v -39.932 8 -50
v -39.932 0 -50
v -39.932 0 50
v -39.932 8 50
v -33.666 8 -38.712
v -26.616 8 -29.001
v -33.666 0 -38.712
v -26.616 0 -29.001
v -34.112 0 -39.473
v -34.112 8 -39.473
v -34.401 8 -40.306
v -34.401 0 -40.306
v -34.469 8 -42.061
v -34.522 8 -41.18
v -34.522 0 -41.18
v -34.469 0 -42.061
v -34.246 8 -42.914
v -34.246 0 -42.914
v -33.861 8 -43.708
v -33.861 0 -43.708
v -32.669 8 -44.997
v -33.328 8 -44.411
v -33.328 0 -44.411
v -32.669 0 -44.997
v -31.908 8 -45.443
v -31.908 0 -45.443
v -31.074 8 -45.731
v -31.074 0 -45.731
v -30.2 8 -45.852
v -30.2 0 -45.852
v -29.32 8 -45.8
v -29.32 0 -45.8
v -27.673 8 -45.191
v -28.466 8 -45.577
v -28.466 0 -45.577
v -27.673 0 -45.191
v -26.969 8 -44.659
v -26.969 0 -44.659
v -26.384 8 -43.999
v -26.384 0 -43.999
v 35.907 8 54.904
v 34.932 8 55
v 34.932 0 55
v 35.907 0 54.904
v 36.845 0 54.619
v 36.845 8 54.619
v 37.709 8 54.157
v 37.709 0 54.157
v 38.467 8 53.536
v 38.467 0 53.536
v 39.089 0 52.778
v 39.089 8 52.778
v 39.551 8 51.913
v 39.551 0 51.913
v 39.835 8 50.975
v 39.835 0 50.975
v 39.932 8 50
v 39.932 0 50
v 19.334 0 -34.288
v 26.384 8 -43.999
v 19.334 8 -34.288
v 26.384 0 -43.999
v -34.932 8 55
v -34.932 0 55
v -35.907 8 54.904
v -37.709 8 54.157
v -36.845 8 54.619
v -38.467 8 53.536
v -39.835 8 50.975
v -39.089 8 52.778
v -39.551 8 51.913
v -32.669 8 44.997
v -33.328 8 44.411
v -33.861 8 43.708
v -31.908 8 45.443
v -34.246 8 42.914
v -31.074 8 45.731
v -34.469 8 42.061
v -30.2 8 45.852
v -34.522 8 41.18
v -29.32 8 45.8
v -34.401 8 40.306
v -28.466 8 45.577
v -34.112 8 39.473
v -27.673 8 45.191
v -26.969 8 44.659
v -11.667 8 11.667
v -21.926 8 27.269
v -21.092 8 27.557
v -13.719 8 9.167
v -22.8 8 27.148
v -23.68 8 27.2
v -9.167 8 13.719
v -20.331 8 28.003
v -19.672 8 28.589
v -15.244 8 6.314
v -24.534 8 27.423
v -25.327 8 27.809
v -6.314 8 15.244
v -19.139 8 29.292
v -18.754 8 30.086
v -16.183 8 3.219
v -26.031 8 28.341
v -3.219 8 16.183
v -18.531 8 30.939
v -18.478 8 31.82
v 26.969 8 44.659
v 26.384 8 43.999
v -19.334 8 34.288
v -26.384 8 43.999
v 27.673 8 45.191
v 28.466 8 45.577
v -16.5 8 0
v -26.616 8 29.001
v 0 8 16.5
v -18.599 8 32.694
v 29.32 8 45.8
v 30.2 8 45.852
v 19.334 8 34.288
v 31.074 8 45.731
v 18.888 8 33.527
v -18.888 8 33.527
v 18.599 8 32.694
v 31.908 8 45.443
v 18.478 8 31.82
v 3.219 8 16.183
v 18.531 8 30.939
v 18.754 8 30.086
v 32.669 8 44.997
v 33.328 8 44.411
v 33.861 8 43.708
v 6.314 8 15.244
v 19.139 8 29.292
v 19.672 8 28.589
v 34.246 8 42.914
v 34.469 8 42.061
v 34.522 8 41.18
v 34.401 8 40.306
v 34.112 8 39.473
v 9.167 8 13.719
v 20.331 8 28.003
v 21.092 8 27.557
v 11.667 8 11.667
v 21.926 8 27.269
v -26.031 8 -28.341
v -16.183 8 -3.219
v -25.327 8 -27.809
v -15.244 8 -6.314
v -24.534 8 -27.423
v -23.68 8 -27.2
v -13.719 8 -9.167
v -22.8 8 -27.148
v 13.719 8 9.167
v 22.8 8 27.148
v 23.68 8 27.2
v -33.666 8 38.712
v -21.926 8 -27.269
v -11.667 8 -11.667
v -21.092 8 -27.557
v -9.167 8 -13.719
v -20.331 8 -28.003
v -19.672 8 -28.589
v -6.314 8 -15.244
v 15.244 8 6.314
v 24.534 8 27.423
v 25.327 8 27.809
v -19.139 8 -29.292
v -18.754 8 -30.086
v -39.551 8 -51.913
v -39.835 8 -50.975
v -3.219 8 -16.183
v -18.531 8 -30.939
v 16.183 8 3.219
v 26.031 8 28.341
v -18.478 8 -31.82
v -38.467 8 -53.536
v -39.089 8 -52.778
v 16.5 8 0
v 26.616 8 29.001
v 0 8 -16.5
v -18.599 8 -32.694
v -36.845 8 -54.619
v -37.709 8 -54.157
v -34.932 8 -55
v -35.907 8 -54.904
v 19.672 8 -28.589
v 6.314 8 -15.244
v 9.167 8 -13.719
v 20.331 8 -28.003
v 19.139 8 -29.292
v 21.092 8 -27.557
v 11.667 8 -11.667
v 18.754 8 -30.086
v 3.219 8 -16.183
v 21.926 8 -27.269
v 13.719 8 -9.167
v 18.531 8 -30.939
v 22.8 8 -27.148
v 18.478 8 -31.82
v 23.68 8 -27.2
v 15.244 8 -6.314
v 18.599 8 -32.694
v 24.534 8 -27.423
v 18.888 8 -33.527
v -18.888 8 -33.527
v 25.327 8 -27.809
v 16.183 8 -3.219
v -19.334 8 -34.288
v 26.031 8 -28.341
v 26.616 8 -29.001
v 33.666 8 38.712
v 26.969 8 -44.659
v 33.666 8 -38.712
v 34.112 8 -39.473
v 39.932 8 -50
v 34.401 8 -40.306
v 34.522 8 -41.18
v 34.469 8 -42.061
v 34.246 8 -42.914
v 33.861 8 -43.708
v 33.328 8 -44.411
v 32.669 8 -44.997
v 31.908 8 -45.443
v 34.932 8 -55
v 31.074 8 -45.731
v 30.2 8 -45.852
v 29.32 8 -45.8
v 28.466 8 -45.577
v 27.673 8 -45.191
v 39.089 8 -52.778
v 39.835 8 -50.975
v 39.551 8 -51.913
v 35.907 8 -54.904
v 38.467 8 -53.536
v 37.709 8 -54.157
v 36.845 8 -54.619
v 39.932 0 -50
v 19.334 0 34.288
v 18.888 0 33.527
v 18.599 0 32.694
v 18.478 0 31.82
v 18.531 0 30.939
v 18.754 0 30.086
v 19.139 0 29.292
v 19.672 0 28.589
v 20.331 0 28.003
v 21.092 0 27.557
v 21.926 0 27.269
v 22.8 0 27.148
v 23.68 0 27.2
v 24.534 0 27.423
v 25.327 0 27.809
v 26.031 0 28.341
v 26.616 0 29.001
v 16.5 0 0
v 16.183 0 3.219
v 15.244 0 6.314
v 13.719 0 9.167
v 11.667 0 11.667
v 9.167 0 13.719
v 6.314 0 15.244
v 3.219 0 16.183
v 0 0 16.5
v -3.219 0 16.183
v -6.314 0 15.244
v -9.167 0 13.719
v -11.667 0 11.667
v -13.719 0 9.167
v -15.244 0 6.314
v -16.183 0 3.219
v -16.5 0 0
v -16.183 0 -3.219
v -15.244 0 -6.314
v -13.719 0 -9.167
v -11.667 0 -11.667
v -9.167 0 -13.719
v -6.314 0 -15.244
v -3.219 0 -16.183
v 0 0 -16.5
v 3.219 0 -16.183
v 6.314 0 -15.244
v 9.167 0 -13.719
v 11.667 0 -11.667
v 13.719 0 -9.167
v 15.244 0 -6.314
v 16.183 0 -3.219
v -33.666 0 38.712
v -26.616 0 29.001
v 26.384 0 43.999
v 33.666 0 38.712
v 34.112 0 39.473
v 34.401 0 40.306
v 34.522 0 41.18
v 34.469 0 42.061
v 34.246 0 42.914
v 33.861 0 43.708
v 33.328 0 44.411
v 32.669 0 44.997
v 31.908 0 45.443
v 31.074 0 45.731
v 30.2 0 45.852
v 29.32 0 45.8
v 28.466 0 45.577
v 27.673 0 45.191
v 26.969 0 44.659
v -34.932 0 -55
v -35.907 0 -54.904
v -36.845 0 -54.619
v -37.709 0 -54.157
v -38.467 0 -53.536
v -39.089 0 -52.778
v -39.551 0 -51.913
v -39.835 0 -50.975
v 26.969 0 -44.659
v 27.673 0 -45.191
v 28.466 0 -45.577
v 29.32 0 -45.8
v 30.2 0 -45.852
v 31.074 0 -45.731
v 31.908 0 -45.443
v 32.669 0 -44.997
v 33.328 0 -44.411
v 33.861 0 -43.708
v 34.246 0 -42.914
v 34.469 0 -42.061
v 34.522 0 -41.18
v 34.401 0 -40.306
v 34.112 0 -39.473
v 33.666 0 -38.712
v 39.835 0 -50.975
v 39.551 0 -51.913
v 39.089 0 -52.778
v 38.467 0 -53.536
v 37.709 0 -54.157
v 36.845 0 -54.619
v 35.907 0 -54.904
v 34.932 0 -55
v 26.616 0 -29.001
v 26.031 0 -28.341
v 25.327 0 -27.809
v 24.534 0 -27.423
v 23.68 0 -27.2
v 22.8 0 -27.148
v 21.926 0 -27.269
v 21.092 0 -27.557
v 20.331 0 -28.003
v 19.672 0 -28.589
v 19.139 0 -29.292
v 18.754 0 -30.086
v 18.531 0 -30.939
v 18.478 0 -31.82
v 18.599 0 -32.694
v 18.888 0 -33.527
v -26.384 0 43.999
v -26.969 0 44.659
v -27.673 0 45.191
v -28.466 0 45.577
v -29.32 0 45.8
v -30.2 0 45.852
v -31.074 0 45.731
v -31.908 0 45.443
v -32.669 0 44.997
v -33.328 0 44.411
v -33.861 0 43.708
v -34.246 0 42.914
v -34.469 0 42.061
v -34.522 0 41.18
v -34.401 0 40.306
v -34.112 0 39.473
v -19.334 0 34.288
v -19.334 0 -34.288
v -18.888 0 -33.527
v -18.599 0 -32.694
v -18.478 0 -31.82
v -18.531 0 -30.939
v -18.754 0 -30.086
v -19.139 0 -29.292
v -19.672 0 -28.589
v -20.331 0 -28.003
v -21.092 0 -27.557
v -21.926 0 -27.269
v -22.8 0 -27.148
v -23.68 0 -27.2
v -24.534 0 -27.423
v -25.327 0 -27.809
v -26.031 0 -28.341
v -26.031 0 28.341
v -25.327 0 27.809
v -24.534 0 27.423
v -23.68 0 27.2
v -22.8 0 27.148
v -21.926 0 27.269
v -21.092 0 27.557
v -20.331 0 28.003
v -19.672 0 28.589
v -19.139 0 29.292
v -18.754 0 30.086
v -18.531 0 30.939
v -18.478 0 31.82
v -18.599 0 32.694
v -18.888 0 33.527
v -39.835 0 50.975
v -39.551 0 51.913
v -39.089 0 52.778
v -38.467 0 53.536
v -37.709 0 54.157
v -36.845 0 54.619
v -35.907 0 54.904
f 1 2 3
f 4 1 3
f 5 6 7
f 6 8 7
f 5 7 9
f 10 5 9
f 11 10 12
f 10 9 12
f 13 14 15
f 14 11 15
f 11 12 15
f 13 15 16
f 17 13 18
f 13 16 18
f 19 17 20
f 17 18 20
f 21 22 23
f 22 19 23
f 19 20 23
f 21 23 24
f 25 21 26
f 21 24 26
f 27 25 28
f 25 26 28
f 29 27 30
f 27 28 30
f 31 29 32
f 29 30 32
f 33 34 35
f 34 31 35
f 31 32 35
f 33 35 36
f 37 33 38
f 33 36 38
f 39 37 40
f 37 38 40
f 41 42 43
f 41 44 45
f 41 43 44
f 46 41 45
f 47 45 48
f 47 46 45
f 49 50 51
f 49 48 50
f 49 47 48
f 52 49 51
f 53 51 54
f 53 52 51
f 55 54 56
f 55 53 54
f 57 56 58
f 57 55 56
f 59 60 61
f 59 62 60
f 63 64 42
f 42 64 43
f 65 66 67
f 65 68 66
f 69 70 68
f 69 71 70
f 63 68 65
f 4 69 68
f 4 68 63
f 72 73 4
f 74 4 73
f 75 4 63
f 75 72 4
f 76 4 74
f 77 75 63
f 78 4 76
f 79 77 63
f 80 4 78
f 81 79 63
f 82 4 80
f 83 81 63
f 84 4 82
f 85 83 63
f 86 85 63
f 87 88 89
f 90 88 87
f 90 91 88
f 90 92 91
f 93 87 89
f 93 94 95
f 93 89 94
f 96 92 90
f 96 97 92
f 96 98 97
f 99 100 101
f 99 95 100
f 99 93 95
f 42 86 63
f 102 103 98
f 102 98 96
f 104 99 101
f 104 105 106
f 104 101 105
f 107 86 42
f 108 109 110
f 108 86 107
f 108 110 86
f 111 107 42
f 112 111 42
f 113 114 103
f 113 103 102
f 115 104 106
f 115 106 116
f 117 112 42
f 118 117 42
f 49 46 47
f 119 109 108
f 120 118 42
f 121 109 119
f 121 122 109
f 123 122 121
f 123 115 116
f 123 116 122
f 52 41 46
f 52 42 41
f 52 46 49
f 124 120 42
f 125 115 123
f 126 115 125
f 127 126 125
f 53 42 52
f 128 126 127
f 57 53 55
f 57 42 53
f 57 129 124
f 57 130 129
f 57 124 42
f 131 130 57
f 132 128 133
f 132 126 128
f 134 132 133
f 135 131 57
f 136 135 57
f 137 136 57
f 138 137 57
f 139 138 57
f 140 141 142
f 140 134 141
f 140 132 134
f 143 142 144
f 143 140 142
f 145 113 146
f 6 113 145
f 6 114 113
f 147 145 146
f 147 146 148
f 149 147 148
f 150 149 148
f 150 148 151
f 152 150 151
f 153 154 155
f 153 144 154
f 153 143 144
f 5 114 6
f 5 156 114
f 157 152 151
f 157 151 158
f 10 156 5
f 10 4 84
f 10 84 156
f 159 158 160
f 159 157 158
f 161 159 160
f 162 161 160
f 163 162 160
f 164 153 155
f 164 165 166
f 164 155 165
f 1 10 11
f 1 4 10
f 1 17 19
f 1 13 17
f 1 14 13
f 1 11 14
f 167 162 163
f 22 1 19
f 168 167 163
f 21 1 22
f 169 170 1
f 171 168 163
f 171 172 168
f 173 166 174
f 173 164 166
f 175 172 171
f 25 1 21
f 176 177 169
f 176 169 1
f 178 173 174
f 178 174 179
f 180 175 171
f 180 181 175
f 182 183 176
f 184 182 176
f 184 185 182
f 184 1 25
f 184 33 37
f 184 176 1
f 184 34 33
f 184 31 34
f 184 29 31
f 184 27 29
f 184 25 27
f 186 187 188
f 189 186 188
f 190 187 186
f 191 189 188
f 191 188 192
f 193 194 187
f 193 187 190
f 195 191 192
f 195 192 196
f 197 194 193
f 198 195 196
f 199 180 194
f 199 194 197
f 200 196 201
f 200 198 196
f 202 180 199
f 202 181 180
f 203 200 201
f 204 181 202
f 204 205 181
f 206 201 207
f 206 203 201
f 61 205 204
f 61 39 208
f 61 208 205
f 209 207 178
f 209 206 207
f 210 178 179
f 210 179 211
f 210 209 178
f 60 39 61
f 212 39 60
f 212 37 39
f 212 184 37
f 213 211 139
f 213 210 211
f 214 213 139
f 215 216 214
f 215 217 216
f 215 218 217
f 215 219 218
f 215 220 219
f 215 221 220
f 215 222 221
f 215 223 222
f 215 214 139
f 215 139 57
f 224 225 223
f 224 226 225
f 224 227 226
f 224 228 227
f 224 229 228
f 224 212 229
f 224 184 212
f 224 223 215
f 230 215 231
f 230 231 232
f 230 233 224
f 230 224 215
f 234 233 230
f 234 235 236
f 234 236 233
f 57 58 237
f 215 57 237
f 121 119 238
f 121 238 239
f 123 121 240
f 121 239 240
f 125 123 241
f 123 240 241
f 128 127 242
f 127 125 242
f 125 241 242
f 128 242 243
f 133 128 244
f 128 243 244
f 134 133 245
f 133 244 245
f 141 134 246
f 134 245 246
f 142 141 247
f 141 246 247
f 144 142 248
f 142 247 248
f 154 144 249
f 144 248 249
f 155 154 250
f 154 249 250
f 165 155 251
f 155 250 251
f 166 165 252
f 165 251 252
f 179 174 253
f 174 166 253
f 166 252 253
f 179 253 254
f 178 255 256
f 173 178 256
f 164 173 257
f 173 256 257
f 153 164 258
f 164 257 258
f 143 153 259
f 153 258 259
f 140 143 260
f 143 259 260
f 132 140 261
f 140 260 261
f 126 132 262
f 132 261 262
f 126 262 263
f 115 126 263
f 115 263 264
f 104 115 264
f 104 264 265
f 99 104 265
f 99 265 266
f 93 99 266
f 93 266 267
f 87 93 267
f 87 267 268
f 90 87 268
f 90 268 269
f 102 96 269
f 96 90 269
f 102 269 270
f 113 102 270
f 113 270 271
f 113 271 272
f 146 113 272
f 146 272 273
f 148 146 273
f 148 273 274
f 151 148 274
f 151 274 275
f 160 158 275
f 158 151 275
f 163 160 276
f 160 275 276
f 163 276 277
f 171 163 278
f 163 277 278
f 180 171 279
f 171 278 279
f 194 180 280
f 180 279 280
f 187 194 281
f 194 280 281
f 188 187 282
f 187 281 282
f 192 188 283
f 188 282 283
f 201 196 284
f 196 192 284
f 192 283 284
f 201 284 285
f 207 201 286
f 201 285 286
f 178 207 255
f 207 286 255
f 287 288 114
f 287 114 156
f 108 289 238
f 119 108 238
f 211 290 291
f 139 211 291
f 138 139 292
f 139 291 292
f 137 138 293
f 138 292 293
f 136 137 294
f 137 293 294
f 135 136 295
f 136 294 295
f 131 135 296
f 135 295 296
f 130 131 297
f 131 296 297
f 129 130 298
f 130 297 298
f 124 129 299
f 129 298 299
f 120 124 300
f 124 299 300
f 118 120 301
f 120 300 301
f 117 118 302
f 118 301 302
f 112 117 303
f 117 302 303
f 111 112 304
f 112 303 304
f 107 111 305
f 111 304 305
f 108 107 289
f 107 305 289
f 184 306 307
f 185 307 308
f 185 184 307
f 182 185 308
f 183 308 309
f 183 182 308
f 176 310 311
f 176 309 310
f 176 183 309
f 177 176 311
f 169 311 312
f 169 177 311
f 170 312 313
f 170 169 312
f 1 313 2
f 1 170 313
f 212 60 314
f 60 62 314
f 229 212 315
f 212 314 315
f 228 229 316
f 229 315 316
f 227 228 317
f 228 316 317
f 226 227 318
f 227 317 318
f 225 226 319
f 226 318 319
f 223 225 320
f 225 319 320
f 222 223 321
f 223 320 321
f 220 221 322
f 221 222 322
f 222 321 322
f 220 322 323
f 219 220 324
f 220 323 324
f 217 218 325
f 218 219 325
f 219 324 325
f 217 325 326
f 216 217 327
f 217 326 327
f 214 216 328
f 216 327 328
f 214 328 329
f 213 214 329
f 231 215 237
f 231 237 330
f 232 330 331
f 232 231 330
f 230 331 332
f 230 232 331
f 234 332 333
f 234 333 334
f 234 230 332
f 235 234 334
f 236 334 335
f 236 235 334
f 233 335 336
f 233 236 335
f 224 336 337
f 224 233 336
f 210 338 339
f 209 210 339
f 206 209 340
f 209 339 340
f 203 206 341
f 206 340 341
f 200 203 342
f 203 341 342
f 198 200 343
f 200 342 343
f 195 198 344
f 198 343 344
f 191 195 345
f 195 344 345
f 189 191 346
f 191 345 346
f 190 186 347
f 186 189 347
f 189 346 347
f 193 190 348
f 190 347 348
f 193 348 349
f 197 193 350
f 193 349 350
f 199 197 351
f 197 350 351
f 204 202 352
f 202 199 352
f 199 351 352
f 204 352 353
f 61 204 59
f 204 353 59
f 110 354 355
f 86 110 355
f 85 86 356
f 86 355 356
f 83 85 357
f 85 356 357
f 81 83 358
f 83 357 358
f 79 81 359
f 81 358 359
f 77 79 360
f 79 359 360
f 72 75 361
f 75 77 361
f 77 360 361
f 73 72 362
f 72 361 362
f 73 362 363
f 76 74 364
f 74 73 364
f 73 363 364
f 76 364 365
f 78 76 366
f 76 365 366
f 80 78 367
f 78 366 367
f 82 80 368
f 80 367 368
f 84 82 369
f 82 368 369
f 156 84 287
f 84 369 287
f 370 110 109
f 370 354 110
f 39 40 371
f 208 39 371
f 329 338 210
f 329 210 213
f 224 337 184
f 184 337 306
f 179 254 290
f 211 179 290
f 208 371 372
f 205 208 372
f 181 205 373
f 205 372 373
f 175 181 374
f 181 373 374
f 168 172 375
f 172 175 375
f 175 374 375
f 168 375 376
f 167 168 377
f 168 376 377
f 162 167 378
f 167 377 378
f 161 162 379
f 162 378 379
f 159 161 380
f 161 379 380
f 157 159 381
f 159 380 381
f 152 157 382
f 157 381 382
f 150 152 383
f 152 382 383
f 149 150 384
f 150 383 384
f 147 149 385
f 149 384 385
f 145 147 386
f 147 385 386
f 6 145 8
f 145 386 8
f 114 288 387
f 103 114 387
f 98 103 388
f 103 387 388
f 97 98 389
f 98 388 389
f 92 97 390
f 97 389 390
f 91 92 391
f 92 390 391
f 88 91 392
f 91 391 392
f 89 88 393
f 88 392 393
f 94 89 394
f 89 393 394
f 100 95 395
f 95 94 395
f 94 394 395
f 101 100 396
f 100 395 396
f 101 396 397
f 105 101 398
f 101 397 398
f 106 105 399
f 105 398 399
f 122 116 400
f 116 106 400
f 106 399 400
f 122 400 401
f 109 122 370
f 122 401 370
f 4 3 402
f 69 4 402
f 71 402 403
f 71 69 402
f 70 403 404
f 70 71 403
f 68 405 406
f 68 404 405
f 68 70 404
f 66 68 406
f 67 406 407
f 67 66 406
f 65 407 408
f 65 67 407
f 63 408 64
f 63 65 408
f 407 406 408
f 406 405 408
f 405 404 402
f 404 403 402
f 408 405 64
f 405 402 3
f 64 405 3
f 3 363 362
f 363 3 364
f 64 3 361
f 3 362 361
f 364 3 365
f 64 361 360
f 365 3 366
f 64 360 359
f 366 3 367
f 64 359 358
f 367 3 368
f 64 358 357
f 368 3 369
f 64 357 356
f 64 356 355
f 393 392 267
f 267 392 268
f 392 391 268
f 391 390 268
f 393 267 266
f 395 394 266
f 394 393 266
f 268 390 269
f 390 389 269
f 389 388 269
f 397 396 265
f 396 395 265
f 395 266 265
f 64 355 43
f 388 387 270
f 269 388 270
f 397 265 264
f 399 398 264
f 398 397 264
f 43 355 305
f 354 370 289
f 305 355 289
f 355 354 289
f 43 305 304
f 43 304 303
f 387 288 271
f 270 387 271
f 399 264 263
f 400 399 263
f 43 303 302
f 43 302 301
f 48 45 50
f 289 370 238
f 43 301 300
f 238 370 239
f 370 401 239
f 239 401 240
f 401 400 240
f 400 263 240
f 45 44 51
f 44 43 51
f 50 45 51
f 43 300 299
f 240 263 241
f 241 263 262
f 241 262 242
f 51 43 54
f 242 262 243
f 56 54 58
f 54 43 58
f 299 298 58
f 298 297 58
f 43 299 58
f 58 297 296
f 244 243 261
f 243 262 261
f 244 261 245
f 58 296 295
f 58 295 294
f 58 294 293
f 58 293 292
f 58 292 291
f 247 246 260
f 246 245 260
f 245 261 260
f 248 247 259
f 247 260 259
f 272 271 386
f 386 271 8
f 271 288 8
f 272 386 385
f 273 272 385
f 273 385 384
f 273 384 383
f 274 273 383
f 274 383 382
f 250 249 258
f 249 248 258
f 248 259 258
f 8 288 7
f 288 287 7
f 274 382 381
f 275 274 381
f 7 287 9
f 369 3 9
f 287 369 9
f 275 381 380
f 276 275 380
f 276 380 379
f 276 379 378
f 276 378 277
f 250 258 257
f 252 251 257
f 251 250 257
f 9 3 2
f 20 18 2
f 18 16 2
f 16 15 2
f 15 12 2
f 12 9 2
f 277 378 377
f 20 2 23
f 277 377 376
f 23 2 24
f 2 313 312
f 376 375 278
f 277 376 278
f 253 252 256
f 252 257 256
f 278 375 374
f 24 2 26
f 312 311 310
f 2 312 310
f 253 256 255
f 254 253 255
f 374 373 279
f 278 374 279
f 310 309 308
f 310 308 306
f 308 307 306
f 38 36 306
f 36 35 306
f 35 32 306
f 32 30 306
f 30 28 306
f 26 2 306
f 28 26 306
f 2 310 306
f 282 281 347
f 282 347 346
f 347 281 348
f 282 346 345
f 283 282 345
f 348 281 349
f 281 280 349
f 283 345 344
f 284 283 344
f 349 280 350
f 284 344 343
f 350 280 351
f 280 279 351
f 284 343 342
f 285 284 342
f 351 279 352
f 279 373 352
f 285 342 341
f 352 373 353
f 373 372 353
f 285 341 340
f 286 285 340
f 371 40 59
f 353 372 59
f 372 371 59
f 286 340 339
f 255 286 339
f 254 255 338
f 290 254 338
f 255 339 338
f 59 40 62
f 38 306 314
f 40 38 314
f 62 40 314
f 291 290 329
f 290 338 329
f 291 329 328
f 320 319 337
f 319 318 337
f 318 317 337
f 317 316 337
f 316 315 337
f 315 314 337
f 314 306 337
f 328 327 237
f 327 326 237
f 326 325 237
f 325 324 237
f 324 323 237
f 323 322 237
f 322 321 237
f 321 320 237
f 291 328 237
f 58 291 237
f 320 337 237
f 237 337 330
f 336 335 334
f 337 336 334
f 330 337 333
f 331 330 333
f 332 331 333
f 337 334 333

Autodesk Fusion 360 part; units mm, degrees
sketch "Sketch1" plane through (0, 0, 0) normal (0, 1, 0) x (1, 0, 0)
  line L0 (22.9749, 31.6447) -> (-22.9749, 31.6447) construction
  line L1 (-22.9749, 31.6447) -> (-22.9749, -31.6447) construction
  line L2 (-22.9749, -31.6447) -> (22.9749, -31.6447) construction
  line L3 (22.9749, -31.6447) -> (22.9749, 31.6447) construction
  line L4 (22.9749, 31.6447) -> (-22.9749, -31.6447) construction
  line L5 (-22.9749, 31.6447) -> (22.9749, -31.6447) construction
  line L6 (30.0251, 41.3553) -> (-30.0251, 41.3553) construction
  line L7 (-30.0251, 41.3553) -> (-30.0251, -41.3553) construction
  line L8 (-30.0251, -41.3553) -> (30.0251, -41.3553) construction
  line L9 (30.0251, -41.3553) -> (30.0251, 41.3553) construction
  line L10 (30.0251, 41.3553) -> (-30.0251, -41.3553) construction
  line L11 (-30.0251, 41.3553) -> (30.0251, -41.3553) construction
  line L12 (26.6164, 29.0009) -> (33.6665, 38.7115)
  arc A0 (33.6665, 38.7115) -> (26.3836, 43.9991) centre (30.0251, 41.3553) ccw
  line L13 (26.3836, 43.9991) -> (19.3335, 34.2885)
  arc A1 (19.3335, 34.2885) -> (26.6164, 29.0009) centre (22.9749, 31.6447) ccw
  line L14 (22.9749, 31.6447) -> (30.0251, 41.3553) construction
  line L15 (0, 0) -> (0, 52.4802) construction
  line L16 (0, 0) -> (-40, 0) construction
  arc A2 (-26.3836, 43.9991) -> (-33.6665, 38.7115) centre (-30.0251, 41.3553) ccw
  line L17 (-26.6164, 29.0009) -> (-33.6665, 38.7115)
  arc A3 (-26.6164, 29.0009) -> (-19.3335, 34.2885) centre (-22.9749, 31.6447) ccw
  line L18 (-26.3836, 43.9991) -> (-19.3335, 34.2885)
  arc A4 (-33.6665, -38.7115) -> (-26.3836, -43.9991) centre (-30.0251, -41.3553) ccw
  line L19 (-26.3836, -43.9991) -> (-19.3335, -34.2885)
  line L20 (-26.6164, -29.0009) -> (-33.6665, -38.7115)
  arc A5 (-19.3335, -34.2885) -> (-26.6164, -29.0009) centre (-22.9749, -31.6447) ccw
  line L21 (26.3836, -43.9991) -> (19.3335, -34.2885)
  arc A6 (26.3836, -43.9991) -> (33.6665, -38.7115) centre (30.0251, -41.3553) ccw
  line L22 (26.6164, -29.0009) -> (33.6665, -38.7115)
  arc A7 (26.6164, -29.0009) -> (19.3335, -34.2885) centre (22.9749, -31.6447) ccw
  line L23 (39.9315, 55) -> (-39.9315, 55)
  line L24 (-39.9315, 55) -> (-39.9315, -55)
  line L25 (-39.9315, -55) -> (39.9315, -55)
  line L26 (39.9315, -55) -> (39.9315, 55)
  line L27 (39.9315, 55) -> (-39.9315, -55) construction
  line L28 (-39.9315, 55) -> (39.9315, -55) construction
  circle A8 centre (0, 0) radius 16.5
  line L29 (26.5, 36.5) -> (24.038, 38.2875) construction
  point P0 (26.5, 36.5)
  point P1 (-26.5, 36.5)
  point P2 (26.5, -36.5)
  point P3 (-26.5, -36.5)
  dimension "d1" = 4.5
  dimension "d2" = 12
  dimension "d5" = 110
  dimension "d9" = 33
  dimension "d11" = 73
  dimension "d13" = 53
extrude "Extrude1" add sketch "Sketch1" along normal blind 8
fillet "Fillet1" radius 5 4 edges at (39.9315, 4, -55) (-39.9315, 4, 55) (39.9315, 4, 55) (-39.9315, 4, -55)
equation "d1 = ( 9 / 2 ) * 1 mm"
